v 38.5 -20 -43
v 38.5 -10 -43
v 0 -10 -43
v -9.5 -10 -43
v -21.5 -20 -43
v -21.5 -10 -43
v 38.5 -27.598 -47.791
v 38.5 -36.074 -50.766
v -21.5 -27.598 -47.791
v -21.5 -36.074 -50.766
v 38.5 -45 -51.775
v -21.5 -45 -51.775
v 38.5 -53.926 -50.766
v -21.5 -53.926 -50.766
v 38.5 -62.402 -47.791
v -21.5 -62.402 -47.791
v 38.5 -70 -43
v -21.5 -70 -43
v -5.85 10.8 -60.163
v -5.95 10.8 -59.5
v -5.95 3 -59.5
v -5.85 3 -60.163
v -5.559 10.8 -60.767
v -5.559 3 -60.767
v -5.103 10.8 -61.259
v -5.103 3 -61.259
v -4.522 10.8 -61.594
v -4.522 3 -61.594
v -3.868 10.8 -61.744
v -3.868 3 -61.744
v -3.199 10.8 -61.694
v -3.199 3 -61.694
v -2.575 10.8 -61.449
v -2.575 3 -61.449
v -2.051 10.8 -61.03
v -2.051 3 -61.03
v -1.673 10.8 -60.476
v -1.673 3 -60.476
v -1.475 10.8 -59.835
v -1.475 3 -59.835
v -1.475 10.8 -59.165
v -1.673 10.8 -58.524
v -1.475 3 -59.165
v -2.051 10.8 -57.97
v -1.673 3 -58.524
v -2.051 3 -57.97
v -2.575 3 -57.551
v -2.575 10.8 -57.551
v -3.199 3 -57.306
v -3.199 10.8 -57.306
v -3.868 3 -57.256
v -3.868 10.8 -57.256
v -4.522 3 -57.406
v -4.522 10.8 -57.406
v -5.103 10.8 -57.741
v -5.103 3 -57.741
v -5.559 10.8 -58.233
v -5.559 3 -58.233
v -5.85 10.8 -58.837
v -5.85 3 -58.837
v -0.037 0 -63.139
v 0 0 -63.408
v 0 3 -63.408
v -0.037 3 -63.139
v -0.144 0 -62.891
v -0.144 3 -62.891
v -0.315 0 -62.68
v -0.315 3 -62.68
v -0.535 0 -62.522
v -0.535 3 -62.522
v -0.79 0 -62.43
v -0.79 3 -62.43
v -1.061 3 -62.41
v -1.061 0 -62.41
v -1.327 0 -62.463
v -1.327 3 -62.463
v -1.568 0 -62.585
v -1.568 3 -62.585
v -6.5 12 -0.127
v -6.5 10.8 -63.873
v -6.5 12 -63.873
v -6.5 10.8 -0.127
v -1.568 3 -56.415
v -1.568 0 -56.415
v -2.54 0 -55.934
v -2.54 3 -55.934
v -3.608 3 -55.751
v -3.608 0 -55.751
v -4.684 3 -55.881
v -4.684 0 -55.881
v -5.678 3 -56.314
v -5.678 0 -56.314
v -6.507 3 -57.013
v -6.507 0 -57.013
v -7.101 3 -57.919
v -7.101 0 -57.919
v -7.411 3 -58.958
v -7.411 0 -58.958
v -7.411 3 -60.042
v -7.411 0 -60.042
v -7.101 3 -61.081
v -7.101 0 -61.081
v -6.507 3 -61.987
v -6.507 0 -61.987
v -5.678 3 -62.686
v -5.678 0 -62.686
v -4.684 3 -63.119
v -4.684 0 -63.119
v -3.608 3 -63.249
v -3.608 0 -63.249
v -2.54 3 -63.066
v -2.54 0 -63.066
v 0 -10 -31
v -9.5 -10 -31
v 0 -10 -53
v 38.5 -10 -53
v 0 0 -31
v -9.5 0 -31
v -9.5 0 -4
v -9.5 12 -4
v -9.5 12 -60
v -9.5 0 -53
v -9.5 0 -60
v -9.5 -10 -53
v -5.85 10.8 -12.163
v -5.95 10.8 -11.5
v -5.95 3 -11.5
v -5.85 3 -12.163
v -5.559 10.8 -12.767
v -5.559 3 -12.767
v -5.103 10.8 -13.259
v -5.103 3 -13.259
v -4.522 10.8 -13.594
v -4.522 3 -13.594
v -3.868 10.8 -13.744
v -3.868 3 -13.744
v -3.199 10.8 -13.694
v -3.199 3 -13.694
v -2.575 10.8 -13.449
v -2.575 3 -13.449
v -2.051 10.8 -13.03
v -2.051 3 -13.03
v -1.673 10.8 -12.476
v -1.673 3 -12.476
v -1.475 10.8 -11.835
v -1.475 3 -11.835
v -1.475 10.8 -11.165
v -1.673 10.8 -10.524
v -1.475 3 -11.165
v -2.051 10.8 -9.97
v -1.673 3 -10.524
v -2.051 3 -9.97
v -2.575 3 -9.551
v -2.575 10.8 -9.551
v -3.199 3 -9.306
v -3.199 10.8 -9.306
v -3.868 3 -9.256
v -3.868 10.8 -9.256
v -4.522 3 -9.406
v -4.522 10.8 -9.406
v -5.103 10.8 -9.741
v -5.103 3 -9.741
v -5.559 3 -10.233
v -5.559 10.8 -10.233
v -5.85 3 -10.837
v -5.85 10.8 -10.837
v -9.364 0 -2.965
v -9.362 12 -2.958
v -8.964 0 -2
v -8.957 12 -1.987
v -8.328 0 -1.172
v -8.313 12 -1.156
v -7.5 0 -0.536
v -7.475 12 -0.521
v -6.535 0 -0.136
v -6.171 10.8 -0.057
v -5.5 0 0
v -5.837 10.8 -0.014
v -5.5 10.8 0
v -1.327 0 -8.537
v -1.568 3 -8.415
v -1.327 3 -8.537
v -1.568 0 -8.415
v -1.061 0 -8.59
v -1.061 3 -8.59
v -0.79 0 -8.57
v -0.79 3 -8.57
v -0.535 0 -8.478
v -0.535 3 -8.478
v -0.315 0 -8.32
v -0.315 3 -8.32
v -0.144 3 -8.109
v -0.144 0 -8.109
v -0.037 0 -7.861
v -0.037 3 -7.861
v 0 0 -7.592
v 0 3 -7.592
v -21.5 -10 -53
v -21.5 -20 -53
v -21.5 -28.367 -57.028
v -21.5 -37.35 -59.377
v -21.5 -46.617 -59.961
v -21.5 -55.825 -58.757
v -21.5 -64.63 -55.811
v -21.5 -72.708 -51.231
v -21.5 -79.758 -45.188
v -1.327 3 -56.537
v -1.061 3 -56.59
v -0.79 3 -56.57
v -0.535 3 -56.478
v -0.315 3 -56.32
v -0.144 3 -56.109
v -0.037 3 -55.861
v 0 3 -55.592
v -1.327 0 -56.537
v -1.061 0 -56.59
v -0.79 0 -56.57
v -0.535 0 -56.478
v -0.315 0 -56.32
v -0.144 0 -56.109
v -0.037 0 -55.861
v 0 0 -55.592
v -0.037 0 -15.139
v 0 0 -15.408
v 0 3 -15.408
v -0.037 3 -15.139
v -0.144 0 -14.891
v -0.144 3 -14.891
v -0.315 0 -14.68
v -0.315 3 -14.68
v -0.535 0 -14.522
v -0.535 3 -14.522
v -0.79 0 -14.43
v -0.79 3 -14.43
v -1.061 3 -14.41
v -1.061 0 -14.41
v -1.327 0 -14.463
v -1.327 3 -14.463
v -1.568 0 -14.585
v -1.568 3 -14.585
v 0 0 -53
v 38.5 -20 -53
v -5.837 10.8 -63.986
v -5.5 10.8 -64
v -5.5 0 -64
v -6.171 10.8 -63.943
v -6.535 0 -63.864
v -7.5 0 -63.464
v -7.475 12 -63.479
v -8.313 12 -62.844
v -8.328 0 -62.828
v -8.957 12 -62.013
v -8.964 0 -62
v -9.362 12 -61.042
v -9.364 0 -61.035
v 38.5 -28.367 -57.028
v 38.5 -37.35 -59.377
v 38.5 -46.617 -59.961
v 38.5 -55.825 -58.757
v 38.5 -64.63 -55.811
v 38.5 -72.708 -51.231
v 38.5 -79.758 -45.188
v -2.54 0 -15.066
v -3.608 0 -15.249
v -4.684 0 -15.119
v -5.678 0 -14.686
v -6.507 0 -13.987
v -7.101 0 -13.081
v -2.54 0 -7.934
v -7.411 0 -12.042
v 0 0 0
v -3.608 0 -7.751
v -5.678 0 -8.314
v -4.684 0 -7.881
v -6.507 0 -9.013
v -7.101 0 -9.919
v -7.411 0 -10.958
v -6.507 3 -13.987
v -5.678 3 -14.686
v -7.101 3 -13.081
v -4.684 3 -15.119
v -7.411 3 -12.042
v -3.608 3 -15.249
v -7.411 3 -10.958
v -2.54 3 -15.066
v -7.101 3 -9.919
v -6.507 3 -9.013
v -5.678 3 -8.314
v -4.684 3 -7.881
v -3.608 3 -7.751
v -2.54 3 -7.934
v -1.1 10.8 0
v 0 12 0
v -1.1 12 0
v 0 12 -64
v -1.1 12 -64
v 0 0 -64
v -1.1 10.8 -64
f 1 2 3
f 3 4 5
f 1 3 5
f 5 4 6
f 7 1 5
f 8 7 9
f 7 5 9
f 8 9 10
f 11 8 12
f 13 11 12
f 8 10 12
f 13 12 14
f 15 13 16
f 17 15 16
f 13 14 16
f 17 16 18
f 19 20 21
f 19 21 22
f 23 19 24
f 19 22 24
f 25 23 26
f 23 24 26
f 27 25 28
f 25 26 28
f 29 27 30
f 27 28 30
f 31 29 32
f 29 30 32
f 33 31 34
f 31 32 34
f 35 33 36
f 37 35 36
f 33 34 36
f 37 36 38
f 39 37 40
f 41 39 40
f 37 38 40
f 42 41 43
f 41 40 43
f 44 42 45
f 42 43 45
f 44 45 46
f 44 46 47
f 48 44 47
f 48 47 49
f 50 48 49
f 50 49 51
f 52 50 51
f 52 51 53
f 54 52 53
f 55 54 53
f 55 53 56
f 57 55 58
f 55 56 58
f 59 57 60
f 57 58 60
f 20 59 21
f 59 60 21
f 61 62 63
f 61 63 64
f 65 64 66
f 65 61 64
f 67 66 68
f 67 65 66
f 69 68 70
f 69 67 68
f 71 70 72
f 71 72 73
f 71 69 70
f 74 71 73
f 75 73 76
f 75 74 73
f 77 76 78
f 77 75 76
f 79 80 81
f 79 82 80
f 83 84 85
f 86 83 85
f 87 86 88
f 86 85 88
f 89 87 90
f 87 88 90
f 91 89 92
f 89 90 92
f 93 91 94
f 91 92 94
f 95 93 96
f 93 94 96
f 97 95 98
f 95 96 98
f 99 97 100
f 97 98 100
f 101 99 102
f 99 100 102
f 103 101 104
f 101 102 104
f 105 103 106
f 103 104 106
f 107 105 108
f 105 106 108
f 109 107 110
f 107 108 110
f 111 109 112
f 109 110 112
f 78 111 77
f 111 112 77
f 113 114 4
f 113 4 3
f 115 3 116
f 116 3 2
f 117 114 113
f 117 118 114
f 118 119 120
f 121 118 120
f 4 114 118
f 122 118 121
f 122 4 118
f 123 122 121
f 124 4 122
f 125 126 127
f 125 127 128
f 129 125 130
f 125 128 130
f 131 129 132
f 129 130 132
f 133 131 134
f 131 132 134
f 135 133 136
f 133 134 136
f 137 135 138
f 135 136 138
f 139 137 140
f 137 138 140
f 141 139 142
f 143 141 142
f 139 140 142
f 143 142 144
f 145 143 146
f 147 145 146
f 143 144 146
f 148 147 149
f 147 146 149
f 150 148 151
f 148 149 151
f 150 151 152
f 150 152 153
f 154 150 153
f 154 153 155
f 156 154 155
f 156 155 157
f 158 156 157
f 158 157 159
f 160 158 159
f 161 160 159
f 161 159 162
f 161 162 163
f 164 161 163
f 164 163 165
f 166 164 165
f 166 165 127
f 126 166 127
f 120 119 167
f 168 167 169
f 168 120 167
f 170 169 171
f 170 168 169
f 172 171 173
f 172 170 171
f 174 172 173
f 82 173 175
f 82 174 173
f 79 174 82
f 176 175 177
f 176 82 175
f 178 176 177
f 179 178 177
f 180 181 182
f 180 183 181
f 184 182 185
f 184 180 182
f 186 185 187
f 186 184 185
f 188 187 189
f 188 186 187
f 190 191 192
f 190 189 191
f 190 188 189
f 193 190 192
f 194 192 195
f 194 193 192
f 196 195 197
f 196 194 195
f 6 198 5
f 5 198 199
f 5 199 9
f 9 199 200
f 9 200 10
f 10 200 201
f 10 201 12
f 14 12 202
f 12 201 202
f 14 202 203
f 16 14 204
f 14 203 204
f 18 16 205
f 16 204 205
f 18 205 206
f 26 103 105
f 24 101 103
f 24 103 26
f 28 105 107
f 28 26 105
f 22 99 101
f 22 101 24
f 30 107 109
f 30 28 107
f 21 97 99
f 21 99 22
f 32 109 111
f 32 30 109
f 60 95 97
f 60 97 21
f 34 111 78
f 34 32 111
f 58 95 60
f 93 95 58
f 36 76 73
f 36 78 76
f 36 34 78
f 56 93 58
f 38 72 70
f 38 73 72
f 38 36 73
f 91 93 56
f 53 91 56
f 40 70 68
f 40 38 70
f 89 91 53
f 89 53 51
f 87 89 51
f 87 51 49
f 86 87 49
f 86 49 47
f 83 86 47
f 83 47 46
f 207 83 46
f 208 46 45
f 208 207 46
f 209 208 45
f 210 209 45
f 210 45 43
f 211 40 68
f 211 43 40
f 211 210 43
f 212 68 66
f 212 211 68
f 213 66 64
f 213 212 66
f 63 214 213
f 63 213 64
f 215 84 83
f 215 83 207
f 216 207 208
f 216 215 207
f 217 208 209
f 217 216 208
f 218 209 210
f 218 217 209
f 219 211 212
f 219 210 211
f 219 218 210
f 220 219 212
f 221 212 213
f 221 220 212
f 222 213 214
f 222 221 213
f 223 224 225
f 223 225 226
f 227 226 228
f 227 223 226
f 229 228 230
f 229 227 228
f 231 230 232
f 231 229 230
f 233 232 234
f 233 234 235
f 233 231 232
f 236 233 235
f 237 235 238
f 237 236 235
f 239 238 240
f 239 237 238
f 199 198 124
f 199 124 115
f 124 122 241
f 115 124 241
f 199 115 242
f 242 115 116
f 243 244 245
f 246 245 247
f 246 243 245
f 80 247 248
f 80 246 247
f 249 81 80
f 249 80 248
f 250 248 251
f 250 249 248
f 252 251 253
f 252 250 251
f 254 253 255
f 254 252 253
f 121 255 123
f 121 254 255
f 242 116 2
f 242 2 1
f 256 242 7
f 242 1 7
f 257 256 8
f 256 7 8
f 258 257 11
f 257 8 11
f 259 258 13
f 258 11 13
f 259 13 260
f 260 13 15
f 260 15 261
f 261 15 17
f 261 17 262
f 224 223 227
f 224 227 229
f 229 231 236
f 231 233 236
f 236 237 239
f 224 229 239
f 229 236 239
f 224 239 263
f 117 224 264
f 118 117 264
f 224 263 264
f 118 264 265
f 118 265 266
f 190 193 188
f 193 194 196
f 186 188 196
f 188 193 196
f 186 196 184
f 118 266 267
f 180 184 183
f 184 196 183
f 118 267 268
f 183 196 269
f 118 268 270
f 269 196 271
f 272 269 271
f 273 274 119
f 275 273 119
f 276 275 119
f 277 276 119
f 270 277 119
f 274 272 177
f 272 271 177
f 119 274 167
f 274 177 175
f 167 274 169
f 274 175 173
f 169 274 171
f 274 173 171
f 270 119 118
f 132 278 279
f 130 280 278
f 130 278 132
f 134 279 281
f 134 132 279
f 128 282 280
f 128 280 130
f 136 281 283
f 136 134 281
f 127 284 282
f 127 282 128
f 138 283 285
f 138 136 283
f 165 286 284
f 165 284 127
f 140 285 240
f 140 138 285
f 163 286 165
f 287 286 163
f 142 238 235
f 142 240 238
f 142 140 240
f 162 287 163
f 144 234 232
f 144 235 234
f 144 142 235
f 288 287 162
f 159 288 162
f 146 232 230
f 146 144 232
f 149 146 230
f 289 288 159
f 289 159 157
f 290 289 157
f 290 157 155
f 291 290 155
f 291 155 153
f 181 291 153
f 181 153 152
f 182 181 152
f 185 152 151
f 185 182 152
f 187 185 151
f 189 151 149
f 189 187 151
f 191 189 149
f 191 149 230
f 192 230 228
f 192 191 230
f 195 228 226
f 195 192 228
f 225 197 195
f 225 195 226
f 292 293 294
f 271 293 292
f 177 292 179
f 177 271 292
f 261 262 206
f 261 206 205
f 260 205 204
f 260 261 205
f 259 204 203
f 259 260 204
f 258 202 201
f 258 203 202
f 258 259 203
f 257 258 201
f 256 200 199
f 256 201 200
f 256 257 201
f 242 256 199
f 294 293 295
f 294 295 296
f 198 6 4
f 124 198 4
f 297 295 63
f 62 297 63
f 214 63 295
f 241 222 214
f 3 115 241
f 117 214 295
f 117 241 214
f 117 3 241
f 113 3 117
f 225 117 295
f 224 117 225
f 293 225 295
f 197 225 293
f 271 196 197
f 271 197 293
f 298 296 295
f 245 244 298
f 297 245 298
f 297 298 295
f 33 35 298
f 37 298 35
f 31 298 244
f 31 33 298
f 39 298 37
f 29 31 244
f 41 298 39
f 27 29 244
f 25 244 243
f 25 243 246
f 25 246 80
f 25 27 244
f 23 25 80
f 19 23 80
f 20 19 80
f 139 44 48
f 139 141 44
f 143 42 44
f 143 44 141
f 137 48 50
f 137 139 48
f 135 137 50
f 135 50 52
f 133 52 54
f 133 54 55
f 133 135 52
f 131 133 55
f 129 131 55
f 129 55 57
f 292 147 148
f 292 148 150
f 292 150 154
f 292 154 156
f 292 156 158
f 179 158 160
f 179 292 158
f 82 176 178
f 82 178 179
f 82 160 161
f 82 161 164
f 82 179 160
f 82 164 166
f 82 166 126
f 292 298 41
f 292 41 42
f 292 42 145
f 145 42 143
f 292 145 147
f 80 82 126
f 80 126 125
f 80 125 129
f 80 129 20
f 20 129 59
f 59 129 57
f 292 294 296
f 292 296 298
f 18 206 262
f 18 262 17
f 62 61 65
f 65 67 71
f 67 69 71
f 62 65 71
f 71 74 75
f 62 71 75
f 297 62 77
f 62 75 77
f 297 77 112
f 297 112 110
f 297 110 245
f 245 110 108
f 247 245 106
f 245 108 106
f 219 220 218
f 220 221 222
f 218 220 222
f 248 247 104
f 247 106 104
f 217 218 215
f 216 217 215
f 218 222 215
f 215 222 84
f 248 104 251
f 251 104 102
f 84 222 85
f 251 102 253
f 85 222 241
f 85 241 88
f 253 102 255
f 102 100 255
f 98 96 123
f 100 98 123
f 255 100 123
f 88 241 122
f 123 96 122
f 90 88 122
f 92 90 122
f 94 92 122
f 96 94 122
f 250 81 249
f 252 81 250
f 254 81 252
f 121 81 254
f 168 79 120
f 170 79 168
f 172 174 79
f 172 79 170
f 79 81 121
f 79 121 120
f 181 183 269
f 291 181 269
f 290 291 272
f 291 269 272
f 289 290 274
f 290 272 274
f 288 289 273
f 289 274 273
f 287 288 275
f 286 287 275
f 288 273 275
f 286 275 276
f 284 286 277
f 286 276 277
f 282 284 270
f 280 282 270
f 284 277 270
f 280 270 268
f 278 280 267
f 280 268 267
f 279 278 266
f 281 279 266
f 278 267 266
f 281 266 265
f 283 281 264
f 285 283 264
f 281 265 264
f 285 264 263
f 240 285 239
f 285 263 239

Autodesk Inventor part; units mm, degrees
ref_plane "YZ Plane" through (0, 0, 0) normal (1, 0, 0) x (0, 1, 0)
ref_plane "XZ Plane" through (0, 0, 0) normal (0, 1, 0) x (-1, 0, 0)
ref_plane "XY Plane" through (0, 0, 0) normal (0, 0, 1) x (1, 0, 0)
sketch "Sketch1" plane through (0, 0, 0) normal (0, 1, 0) x (-1, 0, 0)
  line L0 (0, 0) -> (9.5, 0)
  line L1 (9.5, 0) -> (9.5, -64)
  line L2 (9.5, -64) -> (0, -64)
  line L3 (0, -64) -> (0, 0)
  circle A0 centre (3.7, -11.5) radius 2.25
  circle A1 centre (3.7, -59.5) radius 2.25
  line L4 (3.7, -11.5) -> (3.7, -59.5) construction
  dimension "d1" = 9.5
  dimension "d2" = 64
  dimension "d3" = 4.5
  dimension "d4" = 48
  dimension "d6" = 3.7
  dimension "d17" = 4.5
extrude "Extrusion1" add sketch "Sketch1" along normal blind 12
sketch "Sketch2" plane through (-9.5, 0, 0) normal (0, 0, 1) x (1, 0, 0)
  line L0 (9.5, 12) -> (0, 12) projected
  line L1 (3, 12) -> (8.4, 12)
  line L2 (8.4, 12) -> (8.4, 10.8)
  line L3 (8.4, 10.8) -> (3, 10.8)
  line L4 (3, 10.8) -> (3, 12)
  line L5 (9.5, 0) -> (9.5, 12) projected
  line L6 (3.55, 0) -> (8.05, 0) projected
  line L7 (3.55, 12) -> (8.05, 12) projected
  line L8 (9.5, 0) -> (9.5, 12) projected
  line L9 (9.5, 0) -> (9.5, 12) projected
  line L10 (3.55, 12) -> (8.05, 12) projected
  line L11 (3.55, 12) -> (3.55, 0) projected
  line L12 (3.55, 12) -> (8.05, 12) projected
  line L13 (3.55, 0) -> (8.05, 0) projected
  line L14 (3.55, 12) -> (8.05, 12) projected
  line L15 (3.55, 0) -> (8.05, 0) projected
  line L16 (3.55, 12) -> (8.05, 12) projected
  line L17 (3.55, 0) -> (8.05, 0) projected
  dimension "d9" = 1.1
  dimension "d10" = 5.4
  dimension "d11" = 1.2
  dimension "d76" = 12
extrude "Extrusion2" cut sketch "Sketch2" against normal up to next
sketch "Sketch3" plane through (0, 0, 0) normal (0, -1, 0) x (1, 0, 0)
  circle A0 centre (-3.7, -11.5) radius 2.25 projected
  circle A1 centre (-3.7, -11.5) radius 3.75
  circle A2 centre (-3.7, -59.5) radius 2.25 projected
  circle A3 centre (-3.7, -59.5) radius 3.75
  point P0 (0, 0)
  dimension "d14" = 7.5
extrude "Extrusion3" cut sketch "Sketch3" against normal blind 3
fillet "Fillet1" radius 1 4 edges at (0, 1.5, -58.8897) (0, 1.5, -60.1103) (0, 1.5, -10.8897) (0, 1.5, -12.1103)
fillet "Fillet2" radius 4 2 edges at (-9.5, 6, -64) (-9.5, 6, 0)
sketch "Sketch28" plane through (0, 0, 0) normal (0, -1, 0) x (1, 0, 0)
  arc A0 (-1.5684, -56.4147) -> (0, -55.592) centre (-1, -55.592) ccw projected
  line L0 (0, -55.592) -> (0, -53)
  line L1 (0, -15.408) -> (0, -55.592) projected
  line L2 (-9.5, -60) -> (-9.5, -4) projected
  line L3 (0, -53) -> (-9.5, -53)
  line L4 (-9.5, -53) -> (-9.5, -31)
  line L5 (-9.5, -31) -> (0, -31)
  line L6 (0, -31) -> (0, -53)
  point P0 (0, 0)
  point P1 (0, -31)
  dimension "d107" = 2.592
  dimension "d108" = 22
extrude "Extrusion19" add sketch "Sketch28" along normal blind 10
sketch "Sketch29" plane through (0, -10, 0) normal (0, -1, 0) x (1, 0, 0)
  line L0 (-9.5, -53) -> (0, -53) projected
  line L1 (-9.5, -53) -> (38.5, -53)
  line L2 (38.5, -53) -> (38.5, -43)
  line L3 (38.5, -43) -> (-21.5, -43)
  line L4 (-21.5, -43) -> (-21.5, -53)
  line L5 (-21.5, -53) -> (-9.5, -53)
  point P0 (0, 0)
  dimension "d111" = 48
  dimension "d112" = 10
  dimension "d113" = 60
  dimension "d114" = 10
extrude "Extrusion20" add sketch "Sketch29" along normal blind 10
sketch "Sketch30" plane through (-21.5, -10, -53) normal (-1, 0, 0) x (0, 0, 1)
  arc A0 (10, -10) -> (10, -60) centre (41.225, -35) ccw
  point P0 (53, 10)
  dimension "d117" = 50
  dimension "d118" = 40
sketch "Sketch31" plane through (0, -20, 0) normal (0, -1, 0) x (1, 0, 0)
  line L0 (-21.5, -43) -> (-21.5, -53) projected
  line L1 (38.5, -43) -> (-21.5, -43) projected
  line L2 (-21.5, -53) -> (38.5, -53)
  line L3 (38.5, -53) -> (38.5, -43)
  line L4 (38.5, -43) -> (-21.5, -43)
  line L5 (-21.5, -43) -> (-21.5, -53)
  point P0 (0, 0)
sweep "Sweep1" add profiles "Sketch31" path "Sketch30"
properties part number "Back"
